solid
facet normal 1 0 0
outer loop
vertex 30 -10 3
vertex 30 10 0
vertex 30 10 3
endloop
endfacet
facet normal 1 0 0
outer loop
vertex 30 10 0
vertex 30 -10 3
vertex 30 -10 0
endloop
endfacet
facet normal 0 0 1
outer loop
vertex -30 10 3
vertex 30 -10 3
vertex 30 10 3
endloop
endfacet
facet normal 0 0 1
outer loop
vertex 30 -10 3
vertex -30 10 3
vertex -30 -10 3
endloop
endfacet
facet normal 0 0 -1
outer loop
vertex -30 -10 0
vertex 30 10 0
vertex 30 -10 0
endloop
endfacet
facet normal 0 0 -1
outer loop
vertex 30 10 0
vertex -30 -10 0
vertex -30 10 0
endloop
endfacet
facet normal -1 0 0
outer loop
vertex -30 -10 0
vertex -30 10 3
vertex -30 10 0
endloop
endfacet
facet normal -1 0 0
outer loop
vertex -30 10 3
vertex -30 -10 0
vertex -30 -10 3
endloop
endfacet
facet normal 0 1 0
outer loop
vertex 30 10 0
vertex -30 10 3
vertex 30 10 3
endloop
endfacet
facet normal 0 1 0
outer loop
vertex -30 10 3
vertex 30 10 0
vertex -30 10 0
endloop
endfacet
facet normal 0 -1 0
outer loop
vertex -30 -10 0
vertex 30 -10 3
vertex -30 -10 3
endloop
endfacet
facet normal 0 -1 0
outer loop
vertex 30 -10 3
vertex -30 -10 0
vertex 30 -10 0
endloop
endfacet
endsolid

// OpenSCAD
// Water Bottle Cage Mount Adapter
// Provides standard 74mm mounting pattern
// Uses M5 bolts into rivnuts in downtube
// NOTE: This is optional - standard water bottle cages bolt directly to rivnuts

include <../../config.scad>

module water_bottle_cage_mount() {
    difference() {
        // Simple flat plate
        translate([-30, -10, 0])
            cube([60, 20, 3]);

        // Mounting holes - 74mm spacing
        for (z_offset = [0, bottle_cage_spacing]) {
            translate([0, 0, z_offset - bottle_cage_spacing/2])
                cylinder(h = 10, d = 5.5, center = true);  // M5 clearance
        }
    }
}

// Render for preview
water_bottle_cage_mount();
